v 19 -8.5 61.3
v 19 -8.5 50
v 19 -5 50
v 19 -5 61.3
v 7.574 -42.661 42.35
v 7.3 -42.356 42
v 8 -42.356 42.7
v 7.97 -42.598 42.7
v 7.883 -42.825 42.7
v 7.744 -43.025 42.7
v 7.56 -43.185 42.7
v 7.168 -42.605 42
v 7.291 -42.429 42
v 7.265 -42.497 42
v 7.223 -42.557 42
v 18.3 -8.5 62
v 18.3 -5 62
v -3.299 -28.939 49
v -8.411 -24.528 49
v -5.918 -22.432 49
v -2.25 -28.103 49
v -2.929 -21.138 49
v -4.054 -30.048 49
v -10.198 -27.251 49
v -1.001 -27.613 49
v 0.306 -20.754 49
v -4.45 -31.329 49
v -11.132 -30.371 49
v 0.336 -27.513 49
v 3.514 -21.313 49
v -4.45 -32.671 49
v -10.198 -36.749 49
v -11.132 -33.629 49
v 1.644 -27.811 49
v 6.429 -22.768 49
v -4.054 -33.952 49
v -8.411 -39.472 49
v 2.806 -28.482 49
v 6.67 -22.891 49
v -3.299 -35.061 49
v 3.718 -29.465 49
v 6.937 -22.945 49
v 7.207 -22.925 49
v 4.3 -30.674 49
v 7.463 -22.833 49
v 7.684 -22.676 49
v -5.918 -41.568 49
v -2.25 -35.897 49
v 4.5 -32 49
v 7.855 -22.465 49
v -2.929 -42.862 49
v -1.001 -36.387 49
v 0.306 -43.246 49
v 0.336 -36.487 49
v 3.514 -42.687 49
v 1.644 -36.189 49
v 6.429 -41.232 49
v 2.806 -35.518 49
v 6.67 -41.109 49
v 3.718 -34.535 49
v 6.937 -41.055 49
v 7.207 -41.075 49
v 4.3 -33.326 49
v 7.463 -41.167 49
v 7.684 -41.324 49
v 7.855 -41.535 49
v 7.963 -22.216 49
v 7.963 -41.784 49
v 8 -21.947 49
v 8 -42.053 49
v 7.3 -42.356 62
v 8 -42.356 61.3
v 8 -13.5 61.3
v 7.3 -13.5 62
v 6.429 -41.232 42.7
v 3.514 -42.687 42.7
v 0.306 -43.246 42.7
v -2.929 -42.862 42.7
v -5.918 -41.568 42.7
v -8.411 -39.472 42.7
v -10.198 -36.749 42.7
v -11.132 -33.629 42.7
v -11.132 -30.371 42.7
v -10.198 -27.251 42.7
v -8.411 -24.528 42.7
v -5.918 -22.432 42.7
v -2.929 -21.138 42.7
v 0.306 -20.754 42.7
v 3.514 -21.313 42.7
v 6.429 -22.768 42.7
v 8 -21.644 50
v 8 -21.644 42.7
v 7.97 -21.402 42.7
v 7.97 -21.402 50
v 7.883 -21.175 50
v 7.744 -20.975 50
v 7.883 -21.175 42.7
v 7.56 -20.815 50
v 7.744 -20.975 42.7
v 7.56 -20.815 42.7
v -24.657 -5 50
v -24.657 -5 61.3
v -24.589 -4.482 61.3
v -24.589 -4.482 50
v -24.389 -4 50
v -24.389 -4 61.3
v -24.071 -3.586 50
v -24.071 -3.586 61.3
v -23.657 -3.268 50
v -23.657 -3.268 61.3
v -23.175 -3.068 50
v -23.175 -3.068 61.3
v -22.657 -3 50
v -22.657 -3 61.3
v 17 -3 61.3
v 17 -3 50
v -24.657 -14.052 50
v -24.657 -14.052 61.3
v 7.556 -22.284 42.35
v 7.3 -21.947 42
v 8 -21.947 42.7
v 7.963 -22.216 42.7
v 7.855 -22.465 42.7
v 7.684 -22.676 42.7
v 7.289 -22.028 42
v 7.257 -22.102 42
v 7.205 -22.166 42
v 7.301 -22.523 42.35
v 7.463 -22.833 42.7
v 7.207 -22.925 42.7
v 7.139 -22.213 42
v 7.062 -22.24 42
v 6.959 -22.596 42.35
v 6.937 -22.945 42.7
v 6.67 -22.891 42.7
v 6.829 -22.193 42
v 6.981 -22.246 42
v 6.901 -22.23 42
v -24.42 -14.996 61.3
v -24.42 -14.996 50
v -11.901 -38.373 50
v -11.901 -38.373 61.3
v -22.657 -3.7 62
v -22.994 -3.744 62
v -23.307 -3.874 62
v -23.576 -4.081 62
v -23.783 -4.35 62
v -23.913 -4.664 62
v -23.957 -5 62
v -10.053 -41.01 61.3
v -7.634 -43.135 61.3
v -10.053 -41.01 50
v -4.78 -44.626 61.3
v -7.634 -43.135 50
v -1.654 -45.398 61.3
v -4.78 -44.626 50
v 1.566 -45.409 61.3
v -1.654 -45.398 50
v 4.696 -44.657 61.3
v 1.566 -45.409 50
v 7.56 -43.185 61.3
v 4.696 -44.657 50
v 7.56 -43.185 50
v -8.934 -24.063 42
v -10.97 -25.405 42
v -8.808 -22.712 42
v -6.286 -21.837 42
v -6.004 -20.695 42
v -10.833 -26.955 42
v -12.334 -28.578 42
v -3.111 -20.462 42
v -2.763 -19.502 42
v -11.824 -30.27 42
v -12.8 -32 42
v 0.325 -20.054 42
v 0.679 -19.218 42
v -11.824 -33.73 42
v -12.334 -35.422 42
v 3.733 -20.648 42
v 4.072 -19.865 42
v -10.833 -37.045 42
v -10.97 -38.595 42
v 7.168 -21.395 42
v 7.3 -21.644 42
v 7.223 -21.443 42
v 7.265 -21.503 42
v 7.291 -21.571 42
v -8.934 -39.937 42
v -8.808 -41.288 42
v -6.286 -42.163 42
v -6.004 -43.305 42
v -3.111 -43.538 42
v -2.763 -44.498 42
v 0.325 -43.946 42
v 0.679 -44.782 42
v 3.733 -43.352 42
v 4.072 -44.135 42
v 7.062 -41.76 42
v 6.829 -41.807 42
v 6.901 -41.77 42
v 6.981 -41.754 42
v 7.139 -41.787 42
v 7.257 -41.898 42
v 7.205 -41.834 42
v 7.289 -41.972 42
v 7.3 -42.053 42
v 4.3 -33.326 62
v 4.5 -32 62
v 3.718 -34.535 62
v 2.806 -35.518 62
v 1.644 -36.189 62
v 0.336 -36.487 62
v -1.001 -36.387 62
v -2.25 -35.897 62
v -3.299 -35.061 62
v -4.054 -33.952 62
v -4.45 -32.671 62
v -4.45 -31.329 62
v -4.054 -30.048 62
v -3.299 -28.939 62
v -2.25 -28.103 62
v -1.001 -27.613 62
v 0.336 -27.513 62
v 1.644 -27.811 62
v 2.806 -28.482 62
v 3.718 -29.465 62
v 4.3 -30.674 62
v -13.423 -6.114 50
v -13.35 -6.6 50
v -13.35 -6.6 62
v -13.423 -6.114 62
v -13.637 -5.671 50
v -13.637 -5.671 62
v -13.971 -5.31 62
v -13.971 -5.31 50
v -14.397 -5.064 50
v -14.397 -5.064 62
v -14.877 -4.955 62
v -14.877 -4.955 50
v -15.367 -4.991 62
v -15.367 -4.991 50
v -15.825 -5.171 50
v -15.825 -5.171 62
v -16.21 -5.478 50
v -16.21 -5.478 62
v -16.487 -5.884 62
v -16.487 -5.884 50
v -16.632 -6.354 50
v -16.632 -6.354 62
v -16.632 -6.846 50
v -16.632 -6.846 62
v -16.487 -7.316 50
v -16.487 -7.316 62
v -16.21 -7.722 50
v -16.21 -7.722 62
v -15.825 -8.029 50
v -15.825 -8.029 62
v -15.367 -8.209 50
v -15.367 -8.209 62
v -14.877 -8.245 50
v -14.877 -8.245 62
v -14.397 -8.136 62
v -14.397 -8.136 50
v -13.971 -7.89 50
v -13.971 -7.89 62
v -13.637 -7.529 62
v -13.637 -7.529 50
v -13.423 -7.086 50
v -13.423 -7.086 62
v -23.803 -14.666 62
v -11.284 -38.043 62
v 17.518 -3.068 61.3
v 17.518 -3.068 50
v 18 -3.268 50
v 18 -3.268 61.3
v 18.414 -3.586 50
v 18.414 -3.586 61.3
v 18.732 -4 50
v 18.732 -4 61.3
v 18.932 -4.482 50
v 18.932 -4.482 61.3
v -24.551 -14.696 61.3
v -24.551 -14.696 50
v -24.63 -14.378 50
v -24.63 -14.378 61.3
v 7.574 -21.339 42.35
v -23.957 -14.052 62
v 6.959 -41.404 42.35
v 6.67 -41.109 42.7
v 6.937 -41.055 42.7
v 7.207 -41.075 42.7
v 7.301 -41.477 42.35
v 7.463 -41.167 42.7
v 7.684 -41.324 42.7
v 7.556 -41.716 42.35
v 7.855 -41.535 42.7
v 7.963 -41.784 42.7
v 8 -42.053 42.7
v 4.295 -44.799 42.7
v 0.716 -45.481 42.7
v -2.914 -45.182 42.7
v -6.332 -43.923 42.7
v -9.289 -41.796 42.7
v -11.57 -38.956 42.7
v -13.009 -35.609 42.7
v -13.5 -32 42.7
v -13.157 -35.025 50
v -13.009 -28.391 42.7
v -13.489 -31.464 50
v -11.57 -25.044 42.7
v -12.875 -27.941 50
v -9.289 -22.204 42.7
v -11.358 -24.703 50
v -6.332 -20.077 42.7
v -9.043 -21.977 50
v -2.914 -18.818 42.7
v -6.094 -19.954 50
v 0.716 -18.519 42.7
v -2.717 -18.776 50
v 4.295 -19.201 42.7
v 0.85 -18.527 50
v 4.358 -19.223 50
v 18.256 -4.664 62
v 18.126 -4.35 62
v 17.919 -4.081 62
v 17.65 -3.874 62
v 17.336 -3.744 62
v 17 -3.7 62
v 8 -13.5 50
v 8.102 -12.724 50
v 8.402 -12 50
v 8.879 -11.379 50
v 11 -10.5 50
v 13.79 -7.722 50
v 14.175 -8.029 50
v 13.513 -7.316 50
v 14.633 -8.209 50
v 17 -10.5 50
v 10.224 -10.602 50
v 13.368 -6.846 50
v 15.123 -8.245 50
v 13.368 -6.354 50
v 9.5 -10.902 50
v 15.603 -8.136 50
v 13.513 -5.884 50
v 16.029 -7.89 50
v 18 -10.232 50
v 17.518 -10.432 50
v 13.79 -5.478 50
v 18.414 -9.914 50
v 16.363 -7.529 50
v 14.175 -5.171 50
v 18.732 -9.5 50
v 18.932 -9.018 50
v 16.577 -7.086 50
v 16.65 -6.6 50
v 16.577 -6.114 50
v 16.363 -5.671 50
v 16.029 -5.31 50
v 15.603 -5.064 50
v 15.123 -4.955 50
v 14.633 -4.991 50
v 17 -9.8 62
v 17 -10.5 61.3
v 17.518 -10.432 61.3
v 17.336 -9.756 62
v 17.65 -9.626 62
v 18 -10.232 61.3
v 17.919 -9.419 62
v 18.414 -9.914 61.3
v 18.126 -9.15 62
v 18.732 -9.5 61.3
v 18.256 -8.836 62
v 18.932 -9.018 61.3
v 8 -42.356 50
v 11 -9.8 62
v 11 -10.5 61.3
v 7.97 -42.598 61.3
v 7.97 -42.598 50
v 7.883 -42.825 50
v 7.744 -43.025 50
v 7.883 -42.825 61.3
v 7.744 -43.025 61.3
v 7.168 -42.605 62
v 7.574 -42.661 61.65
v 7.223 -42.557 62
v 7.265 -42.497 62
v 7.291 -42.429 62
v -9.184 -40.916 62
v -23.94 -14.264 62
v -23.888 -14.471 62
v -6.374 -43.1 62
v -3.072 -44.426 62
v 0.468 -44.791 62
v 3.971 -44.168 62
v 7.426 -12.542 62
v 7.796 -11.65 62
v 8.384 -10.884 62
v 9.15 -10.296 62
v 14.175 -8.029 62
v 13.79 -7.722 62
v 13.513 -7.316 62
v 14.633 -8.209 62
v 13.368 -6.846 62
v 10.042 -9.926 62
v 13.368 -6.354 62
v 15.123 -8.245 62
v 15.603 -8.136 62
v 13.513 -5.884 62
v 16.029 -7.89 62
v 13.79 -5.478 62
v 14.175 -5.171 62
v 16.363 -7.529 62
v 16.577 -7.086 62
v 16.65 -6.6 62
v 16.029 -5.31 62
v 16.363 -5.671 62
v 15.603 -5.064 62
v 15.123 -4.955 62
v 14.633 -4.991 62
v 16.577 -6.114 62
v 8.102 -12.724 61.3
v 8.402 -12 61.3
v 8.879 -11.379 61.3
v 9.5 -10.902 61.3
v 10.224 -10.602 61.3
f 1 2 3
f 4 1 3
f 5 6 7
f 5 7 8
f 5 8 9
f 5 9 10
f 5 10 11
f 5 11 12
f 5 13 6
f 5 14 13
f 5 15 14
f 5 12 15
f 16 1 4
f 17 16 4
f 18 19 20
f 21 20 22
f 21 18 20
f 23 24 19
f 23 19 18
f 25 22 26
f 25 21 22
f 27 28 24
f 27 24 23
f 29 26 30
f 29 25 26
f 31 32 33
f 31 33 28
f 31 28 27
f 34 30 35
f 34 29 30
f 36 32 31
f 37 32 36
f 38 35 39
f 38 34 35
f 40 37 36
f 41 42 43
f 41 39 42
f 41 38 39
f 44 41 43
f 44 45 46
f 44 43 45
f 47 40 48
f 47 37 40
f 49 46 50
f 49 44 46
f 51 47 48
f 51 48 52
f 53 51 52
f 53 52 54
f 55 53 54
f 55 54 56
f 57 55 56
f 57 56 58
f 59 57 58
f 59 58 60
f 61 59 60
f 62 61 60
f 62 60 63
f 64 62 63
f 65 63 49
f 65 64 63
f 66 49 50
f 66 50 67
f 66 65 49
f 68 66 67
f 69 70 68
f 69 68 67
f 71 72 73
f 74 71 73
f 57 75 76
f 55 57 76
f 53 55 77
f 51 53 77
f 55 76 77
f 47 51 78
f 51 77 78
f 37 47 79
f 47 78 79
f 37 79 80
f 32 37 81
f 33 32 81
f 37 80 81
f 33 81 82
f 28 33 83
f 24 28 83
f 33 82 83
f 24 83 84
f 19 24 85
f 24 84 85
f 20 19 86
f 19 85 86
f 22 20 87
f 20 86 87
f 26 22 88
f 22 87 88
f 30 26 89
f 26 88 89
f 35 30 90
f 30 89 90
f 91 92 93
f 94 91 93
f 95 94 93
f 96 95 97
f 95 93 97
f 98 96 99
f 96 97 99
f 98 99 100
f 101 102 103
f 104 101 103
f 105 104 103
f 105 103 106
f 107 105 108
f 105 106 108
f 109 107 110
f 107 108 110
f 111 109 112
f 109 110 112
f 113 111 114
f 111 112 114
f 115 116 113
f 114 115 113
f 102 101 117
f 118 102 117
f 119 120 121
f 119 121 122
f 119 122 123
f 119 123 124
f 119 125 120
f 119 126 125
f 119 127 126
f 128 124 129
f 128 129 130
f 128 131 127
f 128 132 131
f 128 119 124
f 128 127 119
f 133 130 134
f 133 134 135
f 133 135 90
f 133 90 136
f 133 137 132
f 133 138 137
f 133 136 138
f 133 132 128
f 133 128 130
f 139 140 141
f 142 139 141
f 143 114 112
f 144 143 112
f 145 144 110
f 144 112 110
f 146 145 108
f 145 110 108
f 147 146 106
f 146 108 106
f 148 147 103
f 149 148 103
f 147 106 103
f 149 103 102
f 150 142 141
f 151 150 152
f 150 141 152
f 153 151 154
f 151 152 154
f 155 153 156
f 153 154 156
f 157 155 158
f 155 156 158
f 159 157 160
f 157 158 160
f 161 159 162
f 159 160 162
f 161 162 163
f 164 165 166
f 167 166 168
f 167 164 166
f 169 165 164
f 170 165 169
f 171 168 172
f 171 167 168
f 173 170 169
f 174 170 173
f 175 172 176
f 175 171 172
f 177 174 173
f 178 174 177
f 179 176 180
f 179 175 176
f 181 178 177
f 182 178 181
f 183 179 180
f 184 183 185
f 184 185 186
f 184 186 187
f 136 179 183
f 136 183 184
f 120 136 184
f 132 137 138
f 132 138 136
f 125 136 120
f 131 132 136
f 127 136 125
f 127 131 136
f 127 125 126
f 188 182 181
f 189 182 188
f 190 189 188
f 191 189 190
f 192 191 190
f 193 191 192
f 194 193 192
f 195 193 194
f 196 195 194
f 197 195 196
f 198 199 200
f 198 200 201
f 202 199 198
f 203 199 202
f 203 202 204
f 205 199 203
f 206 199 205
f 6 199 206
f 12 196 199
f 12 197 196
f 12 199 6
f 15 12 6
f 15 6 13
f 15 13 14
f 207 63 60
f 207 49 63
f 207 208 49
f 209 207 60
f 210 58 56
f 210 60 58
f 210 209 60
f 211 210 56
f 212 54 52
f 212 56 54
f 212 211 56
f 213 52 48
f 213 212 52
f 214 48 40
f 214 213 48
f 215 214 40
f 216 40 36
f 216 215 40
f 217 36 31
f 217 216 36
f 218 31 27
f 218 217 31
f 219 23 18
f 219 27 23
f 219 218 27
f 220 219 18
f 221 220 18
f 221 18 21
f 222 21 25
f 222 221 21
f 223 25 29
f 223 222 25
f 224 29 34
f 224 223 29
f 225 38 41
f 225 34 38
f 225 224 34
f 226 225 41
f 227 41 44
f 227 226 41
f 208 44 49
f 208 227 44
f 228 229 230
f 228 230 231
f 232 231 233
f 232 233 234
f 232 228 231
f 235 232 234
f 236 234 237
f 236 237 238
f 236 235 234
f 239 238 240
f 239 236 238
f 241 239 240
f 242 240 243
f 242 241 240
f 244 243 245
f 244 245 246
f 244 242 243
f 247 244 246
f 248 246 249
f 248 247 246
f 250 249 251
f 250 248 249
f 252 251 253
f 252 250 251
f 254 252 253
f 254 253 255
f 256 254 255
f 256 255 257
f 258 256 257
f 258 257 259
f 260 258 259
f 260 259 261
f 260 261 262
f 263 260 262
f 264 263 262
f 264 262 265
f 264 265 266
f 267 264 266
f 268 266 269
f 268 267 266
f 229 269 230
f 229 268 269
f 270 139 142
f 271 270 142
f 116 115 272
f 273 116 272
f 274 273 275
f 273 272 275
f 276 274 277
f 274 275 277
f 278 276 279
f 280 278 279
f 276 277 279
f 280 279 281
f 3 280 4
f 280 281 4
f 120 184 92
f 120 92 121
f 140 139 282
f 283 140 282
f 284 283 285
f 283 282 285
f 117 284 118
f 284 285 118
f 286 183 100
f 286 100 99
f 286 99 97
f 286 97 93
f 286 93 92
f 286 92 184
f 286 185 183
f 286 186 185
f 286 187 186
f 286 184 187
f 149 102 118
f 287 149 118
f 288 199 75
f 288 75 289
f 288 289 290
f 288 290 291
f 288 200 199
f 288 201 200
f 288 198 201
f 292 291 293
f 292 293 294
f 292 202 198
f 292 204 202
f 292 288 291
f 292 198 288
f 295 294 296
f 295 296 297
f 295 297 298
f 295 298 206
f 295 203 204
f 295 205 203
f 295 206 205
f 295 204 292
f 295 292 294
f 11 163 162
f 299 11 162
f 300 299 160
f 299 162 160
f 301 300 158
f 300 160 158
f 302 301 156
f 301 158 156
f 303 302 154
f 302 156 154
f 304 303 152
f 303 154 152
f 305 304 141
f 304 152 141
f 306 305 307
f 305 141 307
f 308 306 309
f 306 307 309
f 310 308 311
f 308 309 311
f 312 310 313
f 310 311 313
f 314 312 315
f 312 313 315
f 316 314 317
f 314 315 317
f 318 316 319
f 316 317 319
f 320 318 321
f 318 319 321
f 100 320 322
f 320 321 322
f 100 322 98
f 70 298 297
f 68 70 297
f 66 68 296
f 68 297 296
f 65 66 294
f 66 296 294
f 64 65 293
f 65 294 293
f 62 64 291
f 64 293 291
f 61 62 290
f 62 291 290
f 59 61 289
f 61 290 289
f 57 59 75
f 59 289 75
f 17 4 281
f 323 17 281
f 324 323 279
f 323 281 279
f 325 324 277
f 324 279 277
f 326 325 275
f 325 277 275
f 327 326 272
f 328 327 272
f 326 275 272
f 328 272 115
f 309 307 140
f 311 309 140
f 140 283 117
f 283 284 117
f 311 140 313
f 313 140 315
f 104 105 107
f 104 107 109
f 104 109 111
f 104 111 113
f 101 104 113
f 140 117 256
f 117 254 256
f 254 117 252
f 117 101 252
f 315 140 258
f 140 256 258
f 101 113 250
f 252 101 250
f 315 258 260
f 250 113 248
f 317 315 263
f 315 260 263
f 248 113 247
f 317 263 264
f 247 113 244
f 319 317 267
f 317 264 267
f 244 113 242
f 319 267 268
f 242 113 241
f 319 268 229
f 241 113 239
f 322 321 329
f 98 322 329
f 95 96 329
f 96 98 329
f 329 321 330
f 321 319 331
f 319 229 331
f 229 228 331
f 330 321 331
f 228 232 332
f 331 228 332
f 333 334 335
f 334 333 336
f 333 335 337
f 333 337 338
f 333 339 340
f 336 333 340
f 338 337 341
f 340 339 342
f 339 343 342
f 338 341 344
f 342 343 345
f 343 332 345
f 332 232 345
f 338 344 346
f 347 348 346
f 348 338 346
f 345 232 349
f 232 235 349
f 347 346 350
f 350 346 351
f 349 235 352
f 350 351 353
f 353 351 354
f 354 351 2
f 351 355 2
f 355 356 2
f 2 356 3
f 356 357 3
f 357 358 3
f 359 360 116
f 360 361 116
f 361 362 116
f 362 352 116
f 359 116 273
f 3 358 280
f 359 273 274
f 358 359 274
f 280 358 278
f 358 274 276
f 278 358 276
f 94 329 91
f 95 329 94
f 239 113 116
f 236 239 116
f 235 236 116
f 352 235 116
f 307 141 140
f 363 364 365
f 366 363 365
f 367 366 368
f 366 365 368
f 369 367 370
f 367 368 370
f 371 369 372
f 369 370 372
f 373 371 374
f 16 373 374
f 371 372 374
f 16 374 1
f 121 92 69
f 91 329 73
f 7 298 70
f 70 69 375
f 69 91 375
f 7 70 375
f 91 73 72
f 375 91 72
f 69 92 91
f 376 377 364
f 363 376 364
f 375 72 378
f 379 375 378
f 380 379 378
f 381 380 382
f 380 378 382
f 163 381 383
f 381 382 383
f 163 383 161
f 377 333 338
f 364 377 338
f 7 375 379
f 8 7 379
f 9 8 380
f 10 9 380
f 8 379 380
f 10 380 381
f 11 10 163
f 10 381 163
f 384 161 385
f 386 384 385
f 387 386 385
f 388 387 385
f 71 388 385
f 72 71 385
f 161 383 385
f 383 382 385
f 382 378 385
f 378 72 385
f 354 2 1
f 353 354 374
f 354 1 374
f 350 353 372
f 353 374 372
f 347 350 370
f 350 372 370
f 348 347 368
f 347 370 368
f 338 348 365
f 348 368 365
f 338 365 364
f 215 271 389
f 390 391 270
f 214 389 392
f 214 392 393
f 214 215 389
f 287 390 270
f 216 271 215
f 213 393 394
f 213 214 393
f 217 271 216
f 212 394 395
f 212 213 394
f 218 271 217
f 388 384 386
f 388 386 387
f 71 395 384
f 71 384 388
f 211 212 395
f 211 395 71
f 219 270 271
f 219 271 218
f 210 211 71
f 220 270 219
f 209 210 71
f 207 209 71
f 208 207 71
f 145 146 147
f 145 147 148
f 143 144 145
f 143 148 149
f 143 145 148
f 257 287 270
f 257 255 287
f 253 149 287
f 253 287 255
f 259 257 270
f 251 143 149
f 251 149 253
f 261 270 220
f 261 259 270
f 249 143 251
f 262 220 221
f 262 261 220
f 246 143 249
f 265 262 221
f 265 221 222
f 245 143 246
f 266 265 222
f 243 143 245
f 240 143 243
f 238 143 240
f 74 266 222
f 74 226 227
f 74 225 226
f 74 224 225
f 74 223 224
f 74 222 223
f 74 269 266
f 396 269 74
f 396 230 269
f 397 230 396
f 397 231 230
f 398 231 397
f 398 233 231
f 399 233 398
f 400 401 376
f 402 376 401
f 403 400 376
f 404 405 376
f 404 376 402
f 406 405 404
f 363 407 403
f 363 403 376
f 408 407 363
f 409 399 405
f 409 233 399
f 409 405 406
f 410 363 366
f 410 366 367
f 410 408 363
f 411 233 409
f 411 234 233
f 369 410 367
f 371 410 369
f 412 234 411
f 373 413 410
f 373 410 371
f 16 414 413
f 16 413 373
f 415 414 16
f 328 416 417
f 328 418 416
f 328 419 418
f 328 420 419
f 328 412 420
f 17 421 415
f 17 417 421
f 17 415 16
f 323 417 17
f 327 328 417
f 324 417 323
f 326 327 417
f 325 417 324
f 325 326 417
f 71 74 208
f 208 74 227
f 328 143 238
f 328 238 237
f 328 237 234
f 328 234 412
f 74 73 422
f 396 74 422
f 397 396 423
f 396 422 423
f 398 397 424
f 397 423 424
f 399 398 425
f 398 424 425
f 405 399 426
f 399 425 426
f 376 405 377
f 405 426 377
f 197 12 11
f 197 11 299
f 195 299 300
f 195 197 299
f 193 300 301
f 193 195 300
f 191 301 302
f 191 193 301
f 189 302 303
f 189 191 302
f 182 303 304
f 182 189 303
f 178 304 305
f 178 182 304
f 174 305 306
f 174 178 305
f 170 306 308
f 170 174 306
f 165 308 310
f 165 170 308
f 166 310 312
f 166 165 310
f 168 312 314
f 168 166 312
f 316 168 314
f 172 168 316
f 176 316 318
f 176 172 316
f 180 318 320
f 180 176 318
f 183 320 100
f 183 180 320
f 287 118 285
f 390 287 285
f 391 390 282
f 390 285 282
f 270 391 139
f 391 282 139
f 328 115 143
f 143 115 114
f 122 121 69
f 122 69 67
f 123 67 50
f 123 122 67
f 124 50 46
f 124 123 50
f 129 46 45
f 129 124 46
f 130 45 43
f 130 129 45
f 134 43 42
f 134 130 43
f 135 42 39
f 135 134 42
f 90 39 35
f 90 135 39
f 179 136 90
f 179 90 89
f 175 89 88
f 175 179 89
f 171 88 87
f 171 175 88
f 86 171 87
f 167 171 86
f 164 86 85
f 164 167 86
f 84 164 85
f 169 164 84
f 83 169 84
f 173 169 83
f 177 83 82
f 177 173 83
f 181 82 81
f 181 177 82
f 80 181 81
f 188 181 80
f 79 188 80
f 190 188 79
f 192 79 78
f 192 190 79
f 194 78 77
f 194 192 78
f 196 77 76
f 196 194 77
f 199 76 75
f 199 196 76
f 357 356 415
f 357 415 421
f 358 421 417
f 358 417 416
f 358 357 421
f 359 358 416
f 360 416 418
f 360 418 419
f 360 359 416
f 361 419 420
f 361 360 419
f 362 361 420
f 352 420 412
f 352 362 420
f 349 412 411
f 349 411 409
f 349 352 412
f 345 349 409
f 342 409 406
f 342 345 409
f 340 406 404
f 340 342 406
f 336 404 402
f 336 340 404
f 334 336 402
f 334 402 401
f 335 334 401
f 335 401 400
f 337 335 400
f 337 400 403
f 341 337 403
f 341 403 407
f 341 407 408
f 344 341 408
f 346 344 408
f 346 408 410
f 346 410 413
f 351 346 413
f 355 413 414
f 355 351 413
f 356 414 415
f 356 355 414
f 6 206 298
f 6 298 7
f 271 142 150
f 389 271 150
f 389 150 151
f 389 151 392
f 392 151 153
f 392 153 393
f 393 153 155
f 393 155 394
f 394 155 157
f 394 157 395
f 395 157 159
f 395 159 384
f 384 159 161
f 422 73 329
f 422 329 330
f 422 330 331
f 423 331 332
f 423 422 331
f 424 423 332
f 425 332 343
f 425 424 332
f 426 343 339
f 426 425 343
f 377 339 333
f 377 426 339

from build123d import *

# Parameters (mm, degrees)
SKETCH027_R     = 1.65
SKETCH027_R_2   = 4.5
PAD014_DEPTH    = 12
SKETCH028_R     = 4.5
PAD015_DEPTH    = 8
SKETCH029_R     = 11.25
POCKET006_DEPTH = 7
FILLET001_R     = 3
FILLET003_R     = 1
FILLET004_R     = 2
CHAMFER010_SIZE = 0.7


with BuildPart() as part:
    # Sketch027 → Pad014 (new body)
    with BuildSketch(Plane.XY):
        with BuildLine():
            ThreePointArc((-11.900838, -6.373387), (-2.978027, -13.167435), (8, -10.874282))
            Line((8, -10.874282), (8, 21.5))
            Line((8, 21.5), (19, 21.5))
            Line((19, 21.5), (19, 29))
            Line((19, 29), (-24.657124, 29))
            Line((-24.657124, 29), (-24.657124, 17.446049))
            Line((-24.657124, 17.446049), (-11.900838, -6.373387))
        make_face()
        with Locations((15, 25.4)):
            Circle(SKETCH027_R, mode=Mode.SUBTRACT)
        with Locations((-15, 25.4)):
            Circle(SKETCH027_R, mode=Mode.SUBTRACT)
        Circle(SKETCH027_R_2, mode=Mode.SUBTRACT)
    extrude(amount=PAD014_DEPTH)

    # Sketch028 (on Face11 of Pad014) → Pad015 (join)
    with BuildSketch(Plane(origin=(0, 0, 0), x_dir=(1, 0, 0), z_dir=(0, 0, -1))):
        with BuildLine():
            ThreePointArc((8, 10.874282), (-13.5, 0), (8, -10.874282))
            Line((8, -10.874282), (8, 10.874282))
        make_face()
        Circle(SKETCH028_R, mode=Mode.SUBTRACT)
    extrude(amount=PAD015_DEPTH)

    # Sketch029 (on Face1 of Pad015) → Pocket006 (cut)
    with BuildSketch(Plane(origin=(0, 0, -8), x_dir=(1, 0, 0), z_dir=(0, 0, -1))):
        Circle(SKETCH029_R)
    extrude(amount=-POCKET006_DEPTH, mode=Mode.SUBTRACT)

    # Fillet001
    fillet001_edges = [part.edges().sort_by_distance(p)[0] for p in [
        (8, 21.5, 6),
    ]]
    fillet(fillet001_edges, radius=FILLET001_R)

    # Fillet003
    fillet003_edges = [part.edges().sort_by_distance(p)[0] for p in [
        (8, -10.874282, 2),
        (8, -7.909646, -4.5),
        (8, 7.909646, -4.5),
        (8, 10.874282, -4),
    ]]
    fillet(fillet003_edges, radius=FILLET003_R)

    # Fillet004
    fillet004_edges = [part.edges().sort_by_distance(p)[0] for p in [
        (19, 21.5, 6),
        (19, 29, 6),
        (-24.657124, 17.446049, 6),
        (-24.657124, 29, 6),
    ]]
    fillet(fillet004_edges, radius=FILLET004_R)

    # Chamfer010
    chamfer010_edges = [part.edges().sort_by_distance(p)[0] for p in [
        (-24.657124, 22.473937, 12),
        (-13.5, 0, -8),
    ]]
    chamfer(chamfer010_edges, length=CHAMFER010_SIZE)


with BuildPart() as part_1:
    # Body012 placement: moved
    add(part.part.moved(Location((0, -32, 50))))


solid = part_1.part
